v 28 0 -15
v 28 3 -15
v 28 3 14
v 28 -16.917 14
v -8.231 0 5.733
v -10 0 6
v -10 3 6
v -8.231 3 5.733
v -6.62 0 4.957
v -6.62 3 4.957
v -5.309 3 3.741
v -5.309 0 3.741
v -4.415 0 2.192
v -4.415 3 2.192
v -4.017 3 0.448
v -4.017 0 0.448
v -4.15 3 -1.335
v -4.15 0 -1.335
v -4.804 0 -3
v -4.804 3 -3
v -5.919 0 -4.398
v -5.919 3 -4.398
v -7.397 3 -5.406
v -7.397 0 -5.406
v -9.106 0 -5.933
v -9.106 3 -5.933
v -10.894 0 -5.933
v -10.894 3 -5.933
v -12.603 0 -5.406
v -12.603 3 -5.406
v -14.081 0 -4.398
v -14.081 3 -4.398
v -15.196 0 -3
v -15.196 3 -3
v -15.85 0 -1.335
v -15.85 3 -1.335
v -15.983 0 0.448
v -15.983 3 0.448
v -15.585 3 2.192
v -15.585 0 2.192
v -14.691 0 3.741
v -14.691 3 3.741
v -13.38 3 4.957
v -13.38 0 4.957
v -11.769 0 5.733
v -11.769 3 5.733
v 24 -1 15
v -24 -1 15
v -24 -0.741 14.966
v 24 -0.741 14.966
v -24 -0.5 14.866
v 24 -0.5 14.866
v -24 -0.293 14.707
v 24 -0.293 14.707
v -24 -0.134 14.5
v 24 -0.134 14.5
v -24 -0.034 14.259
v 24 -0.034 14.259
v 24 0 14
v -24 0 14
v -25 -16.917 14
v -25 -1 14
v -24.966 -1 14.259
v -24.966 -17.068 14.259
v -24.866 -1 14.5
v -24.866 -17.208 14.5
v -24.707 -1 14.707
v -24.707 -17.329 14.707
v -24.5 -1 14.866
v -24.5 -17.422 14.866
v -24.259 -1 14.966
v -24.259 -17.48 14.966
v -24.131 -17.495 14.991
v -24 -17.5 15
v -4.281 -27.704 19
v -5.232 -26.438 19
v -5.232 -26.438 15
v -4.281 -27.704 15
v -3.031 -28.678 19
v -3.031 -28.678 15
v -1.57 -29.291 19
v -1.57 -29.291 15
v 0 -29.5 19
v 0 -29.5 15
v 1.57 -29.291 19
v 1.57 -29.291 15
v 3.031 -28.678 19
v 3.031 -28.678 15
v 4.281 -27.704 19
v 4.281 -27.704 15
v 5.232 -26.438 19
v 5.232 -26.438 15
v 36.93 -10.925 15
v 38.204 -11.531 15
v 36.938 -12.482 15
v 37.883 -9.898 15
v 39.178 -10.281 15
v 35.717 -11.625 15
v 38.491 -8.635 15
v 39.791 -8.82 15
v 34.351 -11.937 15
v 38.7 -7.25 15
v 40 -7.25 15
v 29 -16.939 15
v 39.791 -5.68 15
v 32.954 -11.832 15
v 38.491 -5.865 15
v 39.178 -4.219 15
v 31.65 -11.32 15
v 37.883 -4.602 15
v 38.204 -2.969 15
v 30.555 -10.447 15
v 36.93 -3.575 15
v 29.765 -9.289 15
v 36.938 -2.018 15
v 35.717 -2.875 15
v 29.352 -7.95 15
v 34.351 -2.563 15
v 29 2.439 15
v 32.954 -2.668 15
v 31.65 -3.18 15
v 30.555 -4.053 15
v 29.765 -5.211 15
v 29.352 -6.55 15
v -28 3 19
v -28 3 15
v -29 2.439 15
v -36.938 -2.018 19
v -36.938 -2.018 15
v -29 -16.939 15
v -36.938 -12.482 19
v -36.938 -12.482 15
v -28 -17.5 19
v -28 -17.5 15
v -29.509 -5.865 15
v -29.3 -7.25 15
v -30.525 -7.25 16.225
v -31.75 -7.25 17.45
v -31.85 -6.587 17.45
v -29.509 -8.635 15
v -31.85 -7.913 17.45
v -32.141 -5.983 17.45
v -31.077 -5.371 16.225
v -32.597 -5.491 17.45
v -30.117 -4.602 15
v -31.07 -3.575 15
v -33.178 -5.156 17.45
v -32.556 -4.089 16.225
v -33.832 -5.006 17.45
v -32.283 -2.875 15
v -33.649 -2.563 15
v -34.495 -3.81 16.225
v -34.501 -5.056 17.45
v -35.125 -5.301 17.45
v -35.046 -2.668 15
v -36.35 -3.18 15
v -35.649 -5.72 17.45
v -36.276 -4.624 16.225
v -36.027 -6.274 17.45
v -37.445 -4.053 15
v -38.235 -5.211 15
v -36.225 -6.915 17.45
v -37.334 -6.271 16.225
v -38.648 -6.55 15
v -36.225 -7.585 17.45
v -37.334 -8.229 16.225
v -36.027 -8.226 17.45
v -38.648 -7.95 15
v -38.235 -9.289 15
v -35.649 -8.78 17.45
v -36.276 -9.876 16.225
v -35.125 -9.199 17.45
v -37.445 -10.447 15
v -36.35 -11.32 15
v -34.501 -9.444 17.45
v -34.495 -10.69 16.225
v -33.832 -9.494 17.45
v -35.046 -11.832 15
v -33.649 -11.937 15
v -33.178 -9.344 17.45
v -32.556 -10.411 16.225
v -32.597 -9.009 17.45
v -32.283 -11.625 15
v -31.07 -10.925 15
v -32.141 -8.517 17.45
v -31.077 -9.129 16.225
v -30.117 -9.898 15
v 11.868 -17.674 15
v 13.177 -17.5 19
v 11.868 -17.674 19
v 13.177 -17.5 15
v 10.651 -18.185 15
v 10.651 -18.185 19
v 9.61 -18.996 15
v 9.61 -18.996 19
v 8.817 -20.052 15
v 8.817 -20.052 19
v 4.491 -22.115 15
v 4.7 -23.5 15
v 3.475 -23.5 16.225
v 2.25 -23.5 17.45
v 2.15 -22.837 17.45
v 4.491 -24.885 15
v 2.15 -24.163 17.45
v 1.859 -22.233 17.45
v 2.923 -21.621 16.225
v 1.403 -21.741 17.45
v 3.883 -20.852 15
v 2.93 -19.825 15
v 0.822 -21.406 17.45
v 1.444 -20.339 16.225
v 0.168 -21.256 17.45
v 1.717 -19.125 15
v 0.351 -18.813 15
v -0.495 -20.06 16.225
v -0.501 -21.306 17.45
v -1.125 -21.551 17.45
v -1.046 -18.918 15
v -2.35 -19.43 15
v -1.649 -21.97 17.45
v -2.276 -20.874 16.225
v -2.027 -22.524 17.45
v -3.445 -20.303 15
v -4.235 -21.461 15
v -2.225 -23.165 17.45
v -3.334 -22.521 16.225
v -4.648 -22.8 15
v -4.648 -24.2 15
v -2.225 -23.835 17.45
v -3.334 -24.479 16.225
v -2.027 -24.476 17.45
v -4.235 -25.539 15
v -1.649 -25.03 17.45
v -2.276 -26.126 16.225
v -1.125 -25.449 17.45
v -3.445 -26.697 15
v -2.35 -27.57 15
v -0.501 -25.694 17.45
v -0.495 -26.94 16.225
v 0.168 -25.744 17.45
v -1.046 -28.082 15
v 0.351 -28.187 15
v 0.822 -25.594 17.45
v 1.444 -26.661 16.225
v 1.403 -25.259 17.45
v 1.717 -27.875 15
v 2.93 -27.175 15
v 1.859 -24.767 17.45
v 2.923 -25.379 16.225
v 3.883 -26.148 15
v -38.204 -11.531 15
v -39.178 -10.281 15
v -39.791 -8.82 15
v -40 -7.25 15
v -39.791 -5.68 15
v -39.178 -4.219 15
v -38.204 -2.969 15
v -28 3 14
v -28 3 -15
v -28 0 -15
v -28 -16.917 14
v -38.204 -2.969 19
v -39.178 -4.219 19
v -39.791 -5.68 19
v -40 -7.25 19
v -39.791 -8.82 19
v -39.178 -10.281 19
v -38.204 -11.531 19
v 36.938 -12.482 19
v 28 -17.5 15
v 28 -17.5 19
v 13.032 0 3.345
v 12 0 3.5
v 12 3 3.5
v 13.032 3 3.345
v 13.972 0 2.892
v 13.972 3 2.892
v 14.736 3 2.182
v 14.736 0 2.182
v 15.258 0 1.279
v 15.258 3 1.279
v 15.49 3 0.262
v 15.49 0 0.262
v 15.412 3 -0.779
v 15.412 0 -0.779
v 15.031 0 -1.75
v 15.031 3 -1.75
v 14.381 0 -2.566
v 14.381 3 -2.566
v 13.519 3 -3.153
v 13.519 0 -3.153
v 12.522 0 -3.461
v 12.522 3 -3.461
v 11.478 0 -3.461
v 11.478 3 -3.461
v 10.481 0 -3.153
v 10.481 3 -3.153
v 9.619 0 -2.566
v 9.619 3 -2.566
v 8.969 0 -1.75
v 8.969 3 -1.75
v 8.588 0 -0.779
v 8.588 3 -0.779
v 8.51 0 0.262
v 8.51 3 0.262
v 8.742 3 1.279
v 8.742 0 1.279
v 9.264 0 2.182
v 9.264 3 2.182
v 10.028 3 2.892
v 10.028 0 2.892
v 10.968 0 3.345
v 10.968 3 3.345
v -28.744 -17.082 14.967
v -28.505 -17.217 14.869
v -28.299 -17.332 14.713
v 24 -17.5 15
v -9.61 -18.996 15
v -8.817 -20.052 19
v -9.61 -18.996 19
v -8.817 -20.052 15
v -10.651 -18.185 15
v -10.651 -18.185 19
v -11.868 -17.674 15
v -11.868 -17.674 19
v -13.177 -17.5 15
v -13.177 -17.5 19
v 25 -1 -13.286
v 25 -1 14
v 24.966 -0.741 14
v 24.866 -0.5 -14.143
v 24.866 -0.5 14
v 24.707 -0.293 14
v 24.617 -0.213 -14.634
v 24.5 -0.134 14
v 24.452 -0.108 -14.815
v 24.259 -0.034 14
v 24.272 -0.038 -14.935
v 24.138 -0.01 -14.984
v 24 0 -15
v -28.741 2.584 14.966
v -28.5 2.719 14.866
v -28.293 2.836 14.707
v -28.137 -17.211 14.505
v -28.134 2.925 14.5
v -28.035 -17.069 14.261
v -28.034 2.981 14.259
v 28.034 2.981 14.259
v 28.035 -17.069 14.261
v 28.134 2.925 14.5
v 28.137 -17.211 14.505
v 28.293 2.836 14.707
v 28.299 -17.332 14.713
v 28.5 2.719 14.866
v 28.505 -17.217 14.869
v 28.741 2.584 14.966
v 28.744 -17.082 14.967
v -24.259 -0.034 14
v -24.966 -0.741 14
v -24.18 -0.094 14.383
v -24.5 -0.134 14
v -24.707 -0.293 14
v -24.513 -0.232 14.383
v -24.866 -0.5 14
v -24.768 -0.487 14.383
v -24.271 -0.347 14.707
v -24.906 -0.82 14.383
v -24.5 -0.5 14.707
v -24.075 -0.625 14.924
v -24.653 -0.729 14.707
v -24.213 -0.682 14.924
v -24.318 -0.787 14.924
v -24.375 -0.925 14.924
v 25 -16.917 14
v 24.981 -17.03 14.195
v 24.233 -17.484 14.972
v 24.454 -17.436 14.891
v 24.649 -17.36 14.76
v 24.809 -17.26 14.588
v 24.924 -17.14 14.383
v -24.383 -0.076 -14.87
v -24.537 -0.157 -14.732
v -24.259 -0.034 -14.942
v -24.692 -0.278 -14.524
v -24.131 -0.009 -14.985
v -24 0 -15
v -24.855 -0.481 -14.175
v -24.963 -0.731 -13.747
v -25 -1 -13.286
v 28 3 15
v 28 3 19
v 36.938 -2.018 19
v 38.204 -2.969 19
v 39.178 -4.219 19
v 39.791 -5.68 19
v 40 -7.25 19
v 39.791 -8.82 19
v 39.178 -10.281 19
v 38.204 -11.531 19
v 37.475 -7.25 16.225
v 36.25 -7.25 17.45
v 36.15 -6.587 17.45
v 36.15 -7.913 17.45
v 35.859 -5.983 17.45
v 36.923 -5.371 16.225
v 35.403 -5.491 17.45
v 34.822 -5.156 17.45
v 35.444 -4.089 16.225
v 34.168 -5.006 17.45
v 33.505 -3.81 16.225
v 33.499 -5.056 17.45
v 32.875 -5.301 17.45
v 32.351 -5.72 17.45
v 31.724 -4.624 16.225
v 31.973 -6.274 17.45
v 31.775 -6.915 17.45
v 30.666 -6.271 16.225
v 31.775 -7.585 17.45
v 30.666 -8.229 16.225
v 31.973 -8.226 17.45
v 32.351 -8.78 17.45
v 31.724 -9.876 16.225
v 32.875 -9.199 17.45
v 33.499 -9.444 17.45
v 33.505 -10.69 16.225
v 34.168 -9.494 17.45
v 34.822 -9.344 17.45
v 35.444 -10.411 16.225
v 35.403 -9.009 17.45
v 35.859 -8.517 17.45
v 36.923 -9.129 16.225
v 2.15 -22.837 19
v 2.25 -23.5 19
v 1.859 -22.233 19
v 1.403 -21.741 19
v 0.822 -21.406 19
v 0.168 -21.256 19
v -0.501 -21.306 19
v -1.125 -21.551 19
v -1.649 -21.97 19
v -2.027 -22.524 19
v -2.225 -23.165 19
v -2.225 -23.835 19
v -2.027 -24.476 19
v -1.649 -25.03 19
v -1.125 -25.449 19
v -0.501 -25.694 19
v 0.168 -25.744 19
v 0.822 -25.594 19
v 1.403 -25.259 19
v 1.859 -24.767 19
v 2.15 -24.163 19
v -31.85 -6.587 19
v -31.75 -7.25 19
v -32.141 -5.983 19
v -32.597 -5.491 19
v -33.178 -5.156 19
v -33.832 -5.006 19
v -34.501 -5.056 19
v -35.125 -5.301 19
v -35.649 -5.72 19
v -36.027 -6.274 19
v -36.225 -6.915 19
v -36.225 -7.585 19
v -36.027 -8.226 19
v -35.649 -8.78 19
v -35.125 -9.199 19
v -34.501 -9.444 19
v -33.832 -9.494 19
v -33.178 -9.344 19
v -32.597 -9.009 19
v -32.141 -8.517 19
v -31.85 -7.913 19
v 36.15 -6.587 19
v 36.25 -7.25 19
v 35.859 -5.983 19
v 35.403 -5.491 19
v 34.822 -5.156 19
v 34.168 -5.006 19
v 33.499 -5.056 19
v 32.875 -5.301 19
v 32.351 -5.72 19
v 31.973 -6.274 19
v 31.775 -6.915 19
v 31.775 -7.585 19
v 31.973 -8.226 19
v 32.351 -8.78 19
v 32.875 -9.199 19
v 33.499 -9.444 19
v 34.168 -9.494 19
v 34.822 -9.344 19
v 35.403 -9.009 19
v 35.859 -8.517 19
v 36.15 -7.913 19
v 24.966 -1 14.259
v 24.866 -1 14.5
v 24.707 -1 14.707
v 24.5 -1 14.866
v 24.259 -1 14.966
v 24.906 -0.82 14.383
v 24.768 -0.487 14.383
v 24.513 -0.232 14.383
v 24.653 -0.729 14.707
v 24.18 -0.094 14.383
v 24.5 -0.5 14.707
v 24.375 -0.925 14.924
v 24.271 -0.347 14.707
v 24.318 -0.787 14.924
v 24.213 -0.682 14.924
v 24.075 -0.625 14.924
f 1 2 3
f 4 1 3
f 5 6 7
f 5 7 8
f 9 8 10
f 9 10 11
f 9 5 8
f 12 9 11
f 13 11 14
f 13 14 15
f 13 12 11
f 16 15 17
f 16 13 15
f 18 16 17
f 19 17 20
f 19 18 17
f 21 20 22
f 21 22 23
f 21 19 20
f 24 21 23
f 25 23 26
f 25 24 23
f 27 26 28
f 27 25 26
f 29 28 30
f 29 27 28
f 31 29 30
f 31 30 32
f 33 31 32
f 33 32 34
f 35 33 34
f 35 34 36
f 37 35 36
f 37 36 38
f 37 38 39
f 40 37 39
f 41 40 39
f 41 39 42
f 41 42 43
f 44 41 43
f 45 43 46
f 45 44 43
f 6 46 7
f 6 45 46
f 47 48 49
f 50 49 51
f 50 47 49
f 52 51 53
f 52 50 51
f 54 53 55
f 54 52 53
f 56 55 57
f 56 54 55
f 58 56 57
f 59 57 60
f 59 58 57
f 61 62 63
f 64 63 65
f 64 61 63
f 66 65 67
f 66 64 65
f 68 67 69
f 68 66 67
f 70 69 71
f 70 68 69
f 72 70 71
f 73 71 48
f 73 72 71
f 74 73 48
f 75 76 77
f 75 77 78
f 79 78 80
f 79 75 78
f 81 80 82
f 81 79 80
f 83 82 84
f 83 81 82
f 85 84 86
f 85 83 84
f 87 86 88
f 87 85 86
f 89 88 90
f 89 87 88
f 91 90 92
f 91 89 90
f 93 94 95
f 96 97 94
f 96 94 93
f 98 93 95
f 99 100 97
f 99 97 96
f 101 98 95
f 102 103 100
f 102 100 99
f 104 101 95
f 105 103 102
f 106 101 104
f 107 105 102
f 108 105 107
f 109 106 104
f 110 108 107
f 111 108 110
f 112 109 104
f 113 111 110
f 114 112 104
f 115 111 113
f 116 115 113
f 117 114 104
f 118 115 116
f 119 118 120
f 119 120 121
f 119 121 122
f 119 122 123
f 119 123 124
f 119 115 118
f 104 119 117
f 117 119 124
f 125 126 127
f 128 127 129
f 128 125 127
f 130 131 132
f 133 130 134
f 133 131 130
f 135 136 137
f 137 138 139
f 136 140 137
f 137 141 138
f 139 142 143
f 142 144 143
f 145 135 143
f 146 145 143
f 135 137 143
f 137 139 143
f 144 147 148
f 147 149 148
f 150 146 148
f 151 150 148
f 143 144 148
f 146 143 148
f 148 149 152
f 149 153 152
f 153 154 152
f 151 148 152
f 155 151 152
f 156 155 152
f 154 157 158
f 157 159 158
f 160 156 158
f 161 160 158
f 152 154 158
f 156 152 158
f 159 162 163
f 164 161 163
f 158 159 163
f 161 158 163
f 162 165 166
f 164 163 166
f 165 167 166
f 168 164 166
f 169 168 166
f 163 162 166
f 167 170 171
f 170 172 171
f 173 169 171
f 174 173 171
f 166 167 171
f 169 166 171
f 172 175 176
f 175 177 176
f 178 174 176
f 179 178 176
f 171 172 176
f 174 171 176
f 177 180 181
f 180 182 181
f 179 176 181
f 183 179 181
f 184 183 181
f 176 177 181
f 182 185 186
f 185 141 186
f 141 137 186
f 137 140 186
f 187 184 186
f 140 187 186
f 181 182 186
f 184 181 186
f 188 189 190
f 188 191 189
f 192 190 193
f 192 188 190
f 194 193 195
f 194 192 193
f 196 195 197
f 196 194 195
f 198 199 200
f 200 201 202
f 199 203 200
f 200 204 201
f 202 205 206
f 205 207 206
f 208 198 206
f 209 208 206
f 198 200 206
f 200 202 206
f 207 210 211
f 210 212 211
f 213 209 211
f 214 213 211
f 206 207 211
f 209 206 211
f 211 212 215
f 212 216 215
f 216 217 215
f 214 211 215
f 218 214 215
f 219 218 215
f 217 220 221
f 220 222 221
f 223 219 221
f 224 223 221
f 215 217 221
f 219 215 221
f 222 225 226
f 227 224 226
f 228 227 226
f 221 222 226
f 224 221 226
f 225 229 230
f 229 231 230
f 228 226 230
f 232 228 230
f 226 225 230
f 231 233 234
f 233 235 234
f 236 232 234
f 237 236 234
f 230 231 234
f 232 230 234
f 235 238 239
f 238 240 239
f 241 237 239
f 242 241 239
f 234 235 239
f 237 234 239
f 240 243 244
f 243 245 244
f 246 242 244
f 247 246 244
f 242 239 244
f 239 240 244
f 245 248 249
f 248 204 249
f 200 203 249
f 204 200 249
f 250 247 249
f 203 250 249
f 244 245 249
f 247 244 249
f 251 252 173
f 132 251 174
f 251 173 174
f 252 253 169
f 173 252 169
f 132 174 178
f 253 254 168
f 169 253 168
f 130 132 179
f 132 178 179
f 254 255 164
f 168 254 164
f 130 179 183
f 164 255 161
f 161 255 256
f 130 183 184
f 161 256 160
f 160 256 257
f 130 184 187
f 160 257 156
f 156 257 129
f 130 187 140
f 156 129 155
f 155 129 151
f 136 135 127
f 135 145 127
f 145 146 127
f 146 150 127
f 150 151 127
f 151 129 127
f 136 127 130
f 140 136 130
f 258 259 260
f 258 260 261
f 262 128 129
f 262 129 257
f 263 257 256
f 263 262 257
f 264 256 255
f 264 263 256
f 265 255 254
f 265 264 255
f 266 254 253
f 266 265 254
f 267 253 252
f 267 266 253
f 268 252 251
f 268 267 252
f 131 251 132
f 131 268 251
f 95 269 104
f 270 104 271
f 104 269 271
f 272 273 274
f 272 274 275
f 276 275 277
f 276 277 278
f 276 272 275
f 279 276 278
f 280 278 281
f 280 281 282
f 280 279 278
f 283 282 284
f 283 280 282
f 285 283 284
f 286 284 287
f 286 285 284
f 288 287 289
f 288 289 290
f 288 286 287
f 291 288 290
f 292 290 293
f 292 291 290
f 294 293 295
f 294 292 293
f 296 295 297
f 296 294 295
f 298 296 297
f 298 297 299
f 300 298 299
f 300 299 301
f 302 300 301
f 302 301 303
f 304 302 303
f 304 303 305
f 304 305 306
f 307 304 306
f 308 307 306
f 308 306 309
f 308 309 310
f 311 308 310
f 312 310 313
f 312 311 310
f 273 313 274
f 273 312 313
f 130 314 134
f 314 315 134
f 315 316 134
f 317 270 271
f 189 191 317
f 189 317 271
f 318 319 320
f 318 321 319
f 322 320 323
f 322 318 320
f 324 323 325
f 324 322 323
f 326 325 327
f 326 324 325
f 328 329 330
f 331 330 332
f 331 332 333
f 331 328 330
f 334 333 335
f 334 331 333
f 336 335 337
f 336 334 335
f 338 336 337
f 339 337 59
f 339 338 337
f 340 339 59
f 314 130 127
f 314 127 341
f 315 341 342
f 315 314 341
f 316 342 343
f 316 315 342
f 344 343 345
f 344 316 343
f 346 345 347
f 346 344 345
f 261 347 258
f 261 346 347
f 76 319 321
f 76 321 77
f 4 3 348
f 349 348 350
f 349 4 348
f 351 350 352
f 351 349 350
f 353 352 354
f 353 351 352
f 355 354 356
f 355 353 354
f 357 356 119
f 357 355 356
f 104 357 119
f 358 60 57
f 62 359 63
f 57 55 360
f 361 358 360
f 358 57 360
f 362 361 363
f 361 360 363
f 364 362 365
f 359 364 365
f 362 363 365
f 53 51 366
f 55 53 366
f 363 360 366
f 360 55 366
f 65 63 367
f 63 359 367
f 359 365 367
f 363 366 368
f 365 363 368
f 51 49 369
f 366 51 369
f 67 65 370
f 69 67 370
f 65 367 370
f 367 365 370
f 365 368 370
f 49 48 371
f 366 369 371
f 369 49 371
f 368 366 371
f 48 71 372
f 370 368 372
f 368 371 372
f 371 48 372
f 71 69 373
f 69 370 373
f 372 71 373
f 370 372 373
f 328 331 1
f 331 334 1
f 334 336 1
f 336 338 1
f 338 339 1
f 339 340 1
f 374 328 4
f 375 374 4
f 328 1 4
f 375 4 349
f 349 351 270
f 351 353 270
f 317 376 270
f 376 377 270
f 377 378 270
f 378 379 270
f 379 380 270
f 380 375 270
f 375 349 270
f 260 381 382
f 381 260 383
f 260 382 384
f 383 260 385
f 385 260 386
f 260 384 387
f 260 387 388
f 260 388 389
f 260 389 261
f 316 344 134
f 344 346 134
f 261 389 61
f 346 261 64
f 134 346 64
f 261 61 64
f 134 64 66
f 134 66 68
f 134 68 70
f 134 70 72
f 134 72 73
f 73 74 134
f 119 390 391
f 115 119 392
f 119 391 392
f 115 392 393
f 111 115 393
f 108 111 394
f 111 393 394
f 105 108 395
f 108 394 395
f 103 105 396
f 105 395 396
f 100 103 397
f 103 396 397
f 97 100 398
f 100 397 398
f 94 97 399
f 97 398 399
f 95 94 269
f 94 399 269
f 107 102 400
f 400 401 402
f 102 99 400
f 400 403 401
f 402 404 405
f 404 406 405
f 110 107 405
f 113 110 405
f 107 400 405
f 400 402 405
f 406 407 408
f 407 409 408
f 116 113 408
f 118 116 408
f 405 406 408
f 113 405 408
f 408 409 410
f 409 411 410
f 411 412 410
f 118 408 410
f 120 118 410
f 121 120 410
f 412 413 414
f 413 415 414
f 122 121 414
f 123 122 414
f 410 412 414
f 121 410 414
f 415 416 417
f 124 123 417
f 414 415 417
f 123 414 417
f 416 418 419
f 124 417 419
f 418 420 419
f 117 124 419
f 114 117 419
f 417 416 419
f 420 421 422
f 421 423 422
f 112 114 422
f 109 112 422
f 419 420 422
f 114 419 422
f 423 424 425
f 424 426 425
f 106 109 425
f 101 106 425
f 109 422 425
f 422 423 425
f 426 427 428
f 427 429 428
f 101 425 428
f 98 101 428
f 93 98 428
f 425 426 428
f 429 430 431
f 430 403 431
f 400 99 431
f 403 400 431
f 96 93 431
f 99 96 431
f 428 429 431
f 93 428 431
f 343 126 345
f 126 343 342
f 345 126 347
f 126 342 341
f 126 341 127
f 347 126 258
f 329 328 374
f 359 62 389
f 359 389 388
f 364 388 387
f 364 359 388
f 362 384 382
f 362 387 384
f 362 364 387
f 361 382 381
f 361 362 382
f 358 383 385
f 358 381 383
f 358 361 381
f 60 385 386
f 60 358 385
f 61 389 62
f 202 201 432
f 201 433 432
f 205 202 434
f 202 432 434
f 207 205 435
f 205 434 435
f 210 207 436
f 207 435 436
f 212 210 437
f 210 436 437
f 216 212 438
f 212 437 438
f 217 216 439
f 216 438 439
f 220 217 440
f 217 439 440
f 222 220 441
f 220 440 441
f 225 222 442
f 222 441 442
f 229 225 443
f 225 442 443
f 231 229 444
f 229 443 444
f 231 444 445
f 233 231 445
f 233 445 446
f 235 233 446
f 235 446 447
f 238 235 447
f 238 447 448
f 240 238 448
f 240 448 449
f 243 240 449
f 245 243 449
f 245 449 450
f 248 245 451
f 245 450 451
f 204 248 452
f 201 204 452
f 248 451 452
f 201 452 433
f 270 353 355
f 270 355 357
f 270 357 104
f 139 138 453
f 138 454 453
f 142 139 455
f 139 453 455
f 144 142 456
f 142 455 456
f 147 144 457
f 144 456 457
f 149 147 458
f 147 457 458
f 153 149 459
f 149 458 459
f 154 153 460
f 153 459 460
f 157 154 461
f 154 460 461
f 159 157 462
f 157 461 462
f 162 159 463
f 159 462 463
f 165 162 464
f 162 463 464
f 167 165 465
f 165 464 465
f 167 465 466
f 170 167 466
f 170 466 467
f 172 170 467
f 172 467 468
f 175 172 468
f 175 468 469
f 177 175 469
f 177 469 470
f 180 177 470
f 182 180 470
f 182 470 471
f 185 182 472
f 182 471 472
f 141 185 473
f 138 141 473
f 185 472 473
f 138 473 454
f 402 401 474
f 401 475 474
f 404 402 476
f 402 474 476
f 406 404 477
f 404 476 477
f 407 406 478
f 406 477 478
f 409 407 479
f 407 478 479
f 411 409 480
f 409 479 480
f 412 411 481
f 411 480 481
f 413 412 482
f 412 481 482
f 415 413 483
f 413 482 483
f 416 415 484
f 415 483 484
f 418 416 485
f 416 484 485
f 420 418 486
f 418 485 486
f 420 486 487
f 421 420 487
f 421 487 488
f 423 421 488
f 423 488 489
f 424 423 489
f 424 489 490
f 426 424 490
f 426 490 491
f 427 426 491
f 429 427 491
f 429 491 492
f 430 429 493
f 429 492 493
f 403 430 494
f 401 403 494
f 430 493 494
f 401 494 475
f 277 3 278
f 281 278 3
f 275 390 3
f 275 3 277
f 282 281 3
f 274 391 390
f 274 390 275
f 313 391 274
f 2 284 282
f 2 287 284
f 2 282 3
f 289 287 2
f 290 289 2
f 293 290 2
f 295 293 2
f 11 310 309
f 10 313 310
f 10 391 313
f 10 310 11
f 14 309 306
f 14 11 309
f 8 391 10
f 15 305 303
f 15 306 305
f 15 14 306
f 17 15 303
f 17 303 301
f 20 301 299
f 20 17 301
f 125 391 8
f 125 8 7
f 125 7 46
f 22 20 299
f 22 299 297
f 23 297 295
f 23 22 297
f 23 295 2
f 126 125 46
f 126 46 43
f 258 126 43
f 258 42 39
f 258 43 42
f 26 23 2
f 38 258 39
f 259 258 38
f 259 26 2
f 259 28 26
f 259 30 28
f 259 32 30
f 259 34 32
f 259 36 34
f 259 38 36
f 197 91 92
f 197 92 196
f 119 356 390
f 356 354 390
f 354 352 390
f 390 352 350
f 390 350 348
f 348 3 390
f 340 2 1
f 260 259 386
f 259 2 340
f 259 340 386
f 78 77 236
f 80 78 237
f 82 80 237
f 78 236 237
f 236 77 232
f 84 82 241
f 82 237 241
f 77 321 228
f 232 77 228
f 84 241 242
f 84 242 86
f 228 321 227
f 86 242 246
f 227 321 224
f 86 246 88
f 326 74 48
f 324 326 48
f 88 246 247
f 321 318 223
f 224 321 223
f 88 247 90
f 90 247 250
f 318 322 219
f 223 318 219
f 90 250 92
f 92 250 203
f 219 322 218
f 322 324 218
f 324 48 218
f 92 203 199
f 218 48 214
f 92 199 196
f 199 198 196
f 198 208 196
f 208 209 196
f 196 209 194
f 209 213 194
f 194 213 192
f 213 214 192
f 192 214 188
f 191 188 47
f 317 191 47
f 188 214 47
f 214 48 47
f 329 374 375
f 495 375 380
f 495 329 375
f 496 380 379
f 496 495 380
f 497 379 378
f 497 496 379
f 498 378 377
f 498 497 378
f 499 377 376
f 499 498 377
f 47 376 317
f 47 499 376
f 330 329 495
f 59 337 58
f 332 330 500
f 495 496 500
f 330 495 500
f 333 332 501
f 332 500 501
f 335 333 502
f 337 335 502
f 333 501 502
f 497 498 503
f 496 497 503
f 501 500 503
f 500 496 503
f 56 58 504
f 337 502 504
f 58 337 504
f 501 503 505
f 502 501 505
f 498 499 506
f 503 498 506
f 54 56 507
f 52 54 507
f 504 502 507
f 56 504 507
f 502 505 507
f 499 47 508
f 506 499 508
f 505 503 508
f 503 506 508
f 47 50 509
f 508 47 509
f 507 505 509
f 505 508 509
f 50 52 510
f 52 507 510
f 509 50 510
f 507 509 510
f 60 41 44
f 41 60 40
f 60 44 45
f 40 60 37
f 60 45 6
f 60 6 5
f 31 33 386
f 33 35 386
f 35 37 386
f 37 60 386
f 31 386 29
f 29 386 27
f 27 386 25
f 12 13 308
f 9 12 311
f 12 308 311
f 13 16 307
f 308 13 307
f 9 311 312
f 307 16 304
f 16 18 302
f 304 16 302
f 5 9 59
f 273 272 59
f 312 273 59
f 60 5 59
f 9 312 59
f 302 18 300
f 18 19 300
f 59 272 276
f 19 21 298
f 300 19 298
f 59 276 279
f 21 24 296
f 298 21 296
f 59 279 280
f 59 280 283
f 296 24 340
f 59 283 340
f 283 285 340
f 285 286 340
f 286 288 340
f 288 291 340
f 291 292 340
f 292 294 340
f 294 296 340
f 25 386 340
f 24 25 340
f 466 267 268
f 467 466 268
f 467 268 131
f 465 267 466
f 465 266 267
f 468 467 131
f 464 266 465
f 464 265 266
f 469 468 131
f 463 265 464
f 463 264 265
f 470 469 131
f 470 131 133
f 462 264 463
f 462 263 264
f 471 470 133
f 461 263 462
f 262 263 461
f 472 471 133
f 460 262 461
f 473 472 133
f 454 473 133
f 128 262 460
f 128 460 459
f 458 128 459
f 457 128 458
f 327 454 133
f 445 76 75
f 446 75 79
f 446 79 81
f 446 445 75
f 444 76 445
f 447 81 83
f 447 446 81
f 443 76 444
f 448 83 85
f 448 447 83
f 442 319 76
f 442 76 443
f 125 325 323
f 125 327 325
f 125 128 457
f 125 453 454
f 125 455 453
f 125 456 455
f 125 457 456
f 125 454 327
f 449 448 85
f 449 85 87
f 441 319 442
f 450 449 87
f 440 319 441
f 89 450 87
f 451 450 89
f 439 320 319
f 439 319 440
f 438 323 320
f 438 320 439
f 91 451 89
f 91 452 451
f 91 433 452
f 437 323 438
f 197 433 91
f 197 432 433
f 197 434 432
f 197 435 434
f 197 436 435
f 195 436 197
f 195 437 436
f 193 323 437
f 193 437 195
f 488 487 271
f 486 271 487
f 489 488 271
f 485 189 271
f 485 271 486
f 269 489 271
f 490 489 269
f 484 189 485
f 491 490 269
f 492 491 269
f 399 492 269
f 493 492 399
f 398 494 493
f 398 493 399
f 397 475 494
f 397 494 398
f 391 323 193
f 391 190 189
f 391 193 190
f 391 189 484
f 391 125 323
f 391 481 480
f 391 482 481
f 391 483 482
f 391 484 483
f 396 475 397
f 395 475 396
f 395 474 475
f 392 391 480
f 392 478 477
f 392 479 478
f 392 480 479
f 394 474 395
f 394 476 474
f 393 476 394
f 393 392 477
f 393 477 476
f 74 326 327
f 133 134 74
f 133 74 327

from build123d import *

# Parameters (mm, degrees)
SKETCH1_W                                       = 50
SKETCH1_H                                       = 30
SKETCH1_R                                       = 6
SKETCH1_R_2                                     = 3.5
BOSS_EXTRUDE1_DEPTH                             = 3
SKETCH2_W                                       = 50
SKETCH2_H                                       = 20.5
BOSS_EXTRUDE2_DEPTH                             = 4
BOSS_EXTRUDE3_DEPTH                             = 3
BOSS_EXTRUDE4_START                             = -50
BOSS_EXTRUDE4_DEPTH                             = 3
BOSS_EXTRUDE5_DEPTH                             = 4
CSK_FOR_M4_FLAT_HEAD_MACHINE_SCREW1_D           = 4.5
CSK_FOR_M4_FLAT_HEAD_MACHINE_SCREW1_DEPTH       = 10
CSK_FOR_M4_FLAT_HEAD_MACHINE_SCREW1_CSINK_D     = 9.4
CSK_FOR_M4_FLAT_HEAD_MACHINE_SCREW1_CSINK_ANGLE = 90
CSK_FOR_M4_FLAT_HEAD_MACHINE_SCREW1_TIP         = 1.351936393
FILLET1_R                                       = 5
FILLET2_R                                       = 1


with BuildPart() as part:
    # Sketch1 → Boss-Extrude1 (new body)
    with BuildSketch(Plane(origin=(0, 0, 0), x_dir=(1, 0, 0), z_dir=(0, 1, 0))):
        Rectangle(SKETCH1_W, SKETCH1_H)
        with Locations(Location((-10, 0, 0), (0, 0, 270))):
            Circle(SKETCH1_R, mode=Mode.SUBTRACT)
        with Locations(Location((12, 0, 0), (0, 0, 270))):
            Circle(SKETCH1_R_2, mode=Mode.SUBTRACT)
    extrude(amount=BOSS_EXTRUDE1_DEPTH)

    # Sketch2 → Boss-Extrude2 (add)
    with BuildSketch(Plane.XY.offset(15)):
        with Locations((0, -7.25)):
            Rectangle(SKETCH2_W, SKETCH2_H)
    extrude(amount=BOSS_EXTRUDE2_DEPTH)

    # Sketch3 → Boss-Extrude3 (add)
    with BuildSketch(Plane.ZY.offset(25)):
        Polygon((-15, 3), (-15, 0), (15, -17.5), (19, -17.5), (19, 3), align=None)
    extrude(amount=BOSS_EXTRUDE3_DEPTH)

    # Sketch3<2> → Boss-Extrude4 (add)
    with BuildSketch(Plane.ZY.offset(25).offset(BOSS_EXTRUDE4_START)):
        Polygon((-15, 3), (-15, 0), (15, -17.5), (19, -17.5), (19, 3), align=None)
    extrude(amount=-BOSS_EXTRUDE4_DEPTH)

    # Sketch5 → Boss-Extrude5 (add)
    with BuildSketch(Plane.XY.offset(19)):
        with BuildLine():
            Line((-28, 3), (-36.937527692, -2.018276473))
            ThreePointArc((-36.937527692, -2.018276473), (-40, -7.25), (-36.937527692, -12.481723527))
            Line((-36.937527692, -12.481723527), (-28, -17.5))
            Line((-28, -17.5), (-28, 3))
        make_face()
        with BuildLine():
            Line((28, 3), (36.937527692, -2.018276473))
            ThreePointArc((36.937527692, -2.018276473), (40, -7.25), (36.937527692, -12.481723527))
            Line((36.937527692, -12.481723527), (28, -17.5))
            Line((28, -17.5), (28, 3))
        make_face()
        with BuildLine():
            Line((10.25, -17.5), (-10.25, -17.5))
            Line((-10.25, -17.5), (-5.231723527, -26.437527692))
            ThreePointArc((-5.231723527, -26.437527692), (0, -29.5), (5.231723527, -26.437527692))
            Line((5.231723527, -26.437527692), (10.25, -17.5))
        make_face()
    extrude(amount=-BOSS_EXTRUDE5_DEPTH)

    # CSK for M4 Flat Head Machine Screw1
    with Locations(Plane(origin=(0, 0, 15), x_dir=(-1, 0, 0), z_dir=(0, 0, -1))):
        with Locations((-34, -7.25), (34, -7.25), (0, -23.5)):
            CounterSinkHole(CSK_FOR_M4_FLAT_HEAD_MACHINE_SCREW1_D / 2, CSK_FOR_M4_FLAT_HEAD_MACHINE_SCREW1_CSINK_D / 2, depth=CSK_FOR_M4_FLAT_HEAD_MACHINE_SCREW1_DEPTH, counter_sink_angle=CSK_FOR_M4_FLAT_HEAD_MACHINE_SCREW1_CSINK_ANGLE)
            with Locations((0, 0, -(CSK_FOR_M4_FLAT_HEAD_MACHINE_SCREW1_DEPTH + CSK_FOR_M4_FLAT_HEAD_MACHINE_SCREW1_TIP / 2))):  # 118° drill point
                Cone(0, CSK_FOR_M4_FLAT_HEAD_MACHINE_SCREW1_D / 2, CSK_FOR_M4_FLAT_HEAD_MACHINE_SCREW1_TIP, mode=Mode.SUBTRACT)

    # Fillet1
    fillet1_edges = [part.edges().sort_by_distance(p)[0] for p in [
        (-10.25, -17.5, 17),
        (10.25, -17.5, 17),
    ]]
    fillet(fillet1_edges, radius=FILLET1_R)

    # Fillet2
    # the kernel refuses this fillet: 1 mm, written as the material it adds along each edge
    with BuildSketch(Plane(origin=(-24, -1, 14), x_dir=(0, 1, 0), z_dir=(0, 0, 1))) as fillet2_piece_1_section:
        Polygon((0, 0), (FILLET2_R, 0), (FILLET2_R, FILLET2_R), (0, FILLET2_R), align=None)
    fillet2_piece_1 = extrude(amount=FILLET2_R, mode=Mode.PRIVATE)
    fillet2_piece_1 = fillet2_piece_1 - Plane(origin=(-24, -1, 14), x_dir=(0.7071067811865475, -0.7071067811865475, 0), z_dir=(0, 0, 1)) * Sphere(FILLET2_R, mode=Mode.PRIVATE)
    add(fillet2_piece_1)
    with BuildSketch(Plane(origin=(24, -1, 14), x_dir=(1, 0, 0), z_dir=(0, 0, 1))) as fillet2_piece_2_section:
        Polygon((0, 0), (FILLET2_R, 0), (FILLET2_R, FILLET2_R), (0, FILLET2_R), align=None)
    fillet2_piece_2 = extrude(amount=FILLET2_R, mode=Mode.PRIVATE)
    fillet2_piece_2 = fillet2_piece_2 - Plane(origin=(24, -1, 14), x_dir=(-0.7071067811865475, -0.7071067811865475, 0), z_dir=(0, 0, 1)) * Sphere(FILLET2_R, mode=Mode.PRIVATE)
    add(fillet2_piece_2)
    with BuildSketch(Plane(origin=(-25, -17.5, 15), x_dir=(1, 0, 0), z_dir=(0, 1, 0))) as fillet2_piece_3_section:
        with BuildLine():
            CenterArc((FILLET2_R, FILLET2_R), FILLET2_R, 180, 90)
            Line((0, FILLET2_R), (0, 0))
            Line((0, 0), (FILLET2_R, 0))
        make_face()
    fillet2_piece_3 = extrude(amount=16.5, mode=Mode.PRIVATE)
    fillet2_piece_3 = split(fillet2_piece_3, bisect_by=Plane(origin=(-24.77263385, -15.290921561, 11.213008391), z_dir=(0, 0.8637789008984336, 0.5038710255240861)), keep=Keep.TOP, mode=Mode.PRIVATE)
    add(fillet2_piece_3)
    with BuildSketch(Plane(origin=(25, -1, 15), x_dir=(-1, 0, 0), z_dir=(0, -1, 0))) as fillet2_piece_4_section:
        with BuildLine():
            CenterArc((FILLET2_R, FILLET2_R), FILLET2_R, 180, 90)
            Line((0, FILLET2_R), (0, 0))
            Line((0, 0), (FILLET2_R, 0))
        make_face()
    fillet2_piece_4 = extrude(amount=16.5, mode=Mode.PRIVATE)
    fillet2_piece_4 = split(fillet2_piece_4, bisect_by=Plane(origin=(24.77263385, -15.290921561, 11.213008391), z_dir=(0, 0.8637789008984336, 0.5038710255240861)), keep=Keep.TOP, mode=Mode.PRIVATE)
    add(fillet2_piece_4)
    with BuildSketch(Plane(origin=(24, 0, 15), x_dir=(0, -1, 0), z_dir=(-1, 0, 0))) as fillet2_piece_5:
        with BuildLine():
            CenterArc((FILLET2_R, -FILLET2_R), FILLET2_R, 90, 90)
            Line((0, -FILLET2_R), (0, 0))
            Line((0, 0), (FILLET2_R, 0))
        make_face()
    extrude(amount=48)
    with BuildSketch(Plane(origin=(-25, 0, 14), x_dir=(1, 0, 0), z_dir=(0, 0, -1))) as fillet2_piece_6_section:
        with BuildLine():
            CenterArc((FILLET2_R, FILLET2_R), FILLET2_R, 180, 90)
            Line((0, FILLET2_R), (0, 0))
            Line((0, 0), (FILLET2_R, 0))
        make_face()
    fillet2_piece_6 = extrude(amount=29, mode=Mode.PRIVATE)
    fillet2_piece_6 = split(fillet2_piece_6, bisect_by=Plane(origin=(-24.77197237, -6.451381469, -3.94048891), z_dir=(0, 0.8637789008984336, 0.5038710255240861)), keep=Keep.TOP, mode=Mode.PRIVATE)
    add(fillet2_piece_6)
    with BuildSketch(Plane(origin=(25, 0, -15), x_dir=(0, -1, 0), z_dir=(0, 0, 1))) as fillet2_piece_7_section:
        with BuildLine():
            CenterArc((FILLET2_R, -FILLET2_R), FILLET2_R, 90, 90)
            Line((0, -FILLET2_R), (0, 0))
            Line((0, 0), (FILLET2_R, 0))
        make_face()
    fillet2_piece_7 = extrude(amount=29, mode=Mode.PRIVATE)
    fillet2_piece_7 = split(fillet2_piece_7, bisect_by=Plane(origin=(24.77197237, -6.451381469, -3.94048891), z_dir=(0, 0.8637789008984336, 0.5038710255240861)), keep=Keep.TOP, mode=Mode.PRIVATE)
    add(fillet2_piece_7)
    with BuildSketch(Plane(origin=(-28, -20, 15), x_dir=(0, 0, -1), z_dir=(0, 1, 0))) as fillet2_piece_8_section:
        with BuildLine():
            CenterArc((FILLET2_R, FILLET2_R), FILLET2_R, 180, 90)
            Line((0, FILLET2_R), (0, 0))
            Line((0, 0), (FILLET2_R, 0))
        make_face()
    fillet2_piece_8 = extrude(amount=23, mode=Mode.PRIVATE)
    fillet2_piece_8 = split(fillet2_piece_8, bisect_by=Plane(origin=(-28.224621948, -14.787732132, 10.350397941), z_dir=(0, 0.8637789008984336, 0.5038710255240861)), keep=Keep.TOP, mode=Mode.PRIVATE)
    fillet2_piece_8 = split(fillet2_piece_8, bisect_by=Plane(origin=(-32.565520465, -14.936534495, 14.773416923), z_dir=(0.48958794860434196, 0.8719539211342491, 0)), keep=Keep.TOP, mode=Mode.PRIVATE)
    fillet2_piece_8 = split(fillet2_piece_8, bisect_by=Plane(origin=(-32.527453001, 0.457908757, 14.773416923), z_dir=(0.48958794860434235, -0.8719539211342491, 0)), keep=Keep.TOP, mode=Mode.PRIVATE)
    add(fillet2_piece_8)
    with BuildSketch(Plane(origin=(28, -20, 15), x_dir=(1, 0, 0), z_dir=(0, 1, 0))) as fillet2_piece_9_section:
        with BuildLine():
            CenterArc((FILLET2_R, FILLET2_R), FILLET2_R, 180, 90)
            Line((0, FILLET2_R), (0, 0))
            Line((0, 0), (FILLET2_R, 0))
        make_face()
    fillet2_piece_9 = extrude(amount=23, mode=Mode.PRIVATE)
    fillet2_piece_9 = split(fillet2_piece_9, bisect_by=Plane(origin=(32.565520464, -14.936534495, 14.773416923), z_dir=(-0.48958794860434196, 0.8719539211342491, 0)), keep=Keep.TOP, mode=Mode.PRIVATE)
    fillet2_piece_9 = split(fillet2_piece_9, bisect_by=Plane(origin=(28.224621948, -14.787732132, 10.350397941), z_dir=(0, 0.8637789008984336, 0.5038710255240861)), keep=Keep.TOP, mode=Mode.PRIVATE)
    fillet2_piece_9 = split(fillet2_piece_9, bisect_by=Plane(origin=(32.527453001, 0.457908757, 14.773416923), z_dir=(-0.48958794860434235, -0.8719539211342491, 0)), keep=Keep.TOP, mode=Mode.PRIVATE)
    add(fillet2_piece_9)


solid = part.part
